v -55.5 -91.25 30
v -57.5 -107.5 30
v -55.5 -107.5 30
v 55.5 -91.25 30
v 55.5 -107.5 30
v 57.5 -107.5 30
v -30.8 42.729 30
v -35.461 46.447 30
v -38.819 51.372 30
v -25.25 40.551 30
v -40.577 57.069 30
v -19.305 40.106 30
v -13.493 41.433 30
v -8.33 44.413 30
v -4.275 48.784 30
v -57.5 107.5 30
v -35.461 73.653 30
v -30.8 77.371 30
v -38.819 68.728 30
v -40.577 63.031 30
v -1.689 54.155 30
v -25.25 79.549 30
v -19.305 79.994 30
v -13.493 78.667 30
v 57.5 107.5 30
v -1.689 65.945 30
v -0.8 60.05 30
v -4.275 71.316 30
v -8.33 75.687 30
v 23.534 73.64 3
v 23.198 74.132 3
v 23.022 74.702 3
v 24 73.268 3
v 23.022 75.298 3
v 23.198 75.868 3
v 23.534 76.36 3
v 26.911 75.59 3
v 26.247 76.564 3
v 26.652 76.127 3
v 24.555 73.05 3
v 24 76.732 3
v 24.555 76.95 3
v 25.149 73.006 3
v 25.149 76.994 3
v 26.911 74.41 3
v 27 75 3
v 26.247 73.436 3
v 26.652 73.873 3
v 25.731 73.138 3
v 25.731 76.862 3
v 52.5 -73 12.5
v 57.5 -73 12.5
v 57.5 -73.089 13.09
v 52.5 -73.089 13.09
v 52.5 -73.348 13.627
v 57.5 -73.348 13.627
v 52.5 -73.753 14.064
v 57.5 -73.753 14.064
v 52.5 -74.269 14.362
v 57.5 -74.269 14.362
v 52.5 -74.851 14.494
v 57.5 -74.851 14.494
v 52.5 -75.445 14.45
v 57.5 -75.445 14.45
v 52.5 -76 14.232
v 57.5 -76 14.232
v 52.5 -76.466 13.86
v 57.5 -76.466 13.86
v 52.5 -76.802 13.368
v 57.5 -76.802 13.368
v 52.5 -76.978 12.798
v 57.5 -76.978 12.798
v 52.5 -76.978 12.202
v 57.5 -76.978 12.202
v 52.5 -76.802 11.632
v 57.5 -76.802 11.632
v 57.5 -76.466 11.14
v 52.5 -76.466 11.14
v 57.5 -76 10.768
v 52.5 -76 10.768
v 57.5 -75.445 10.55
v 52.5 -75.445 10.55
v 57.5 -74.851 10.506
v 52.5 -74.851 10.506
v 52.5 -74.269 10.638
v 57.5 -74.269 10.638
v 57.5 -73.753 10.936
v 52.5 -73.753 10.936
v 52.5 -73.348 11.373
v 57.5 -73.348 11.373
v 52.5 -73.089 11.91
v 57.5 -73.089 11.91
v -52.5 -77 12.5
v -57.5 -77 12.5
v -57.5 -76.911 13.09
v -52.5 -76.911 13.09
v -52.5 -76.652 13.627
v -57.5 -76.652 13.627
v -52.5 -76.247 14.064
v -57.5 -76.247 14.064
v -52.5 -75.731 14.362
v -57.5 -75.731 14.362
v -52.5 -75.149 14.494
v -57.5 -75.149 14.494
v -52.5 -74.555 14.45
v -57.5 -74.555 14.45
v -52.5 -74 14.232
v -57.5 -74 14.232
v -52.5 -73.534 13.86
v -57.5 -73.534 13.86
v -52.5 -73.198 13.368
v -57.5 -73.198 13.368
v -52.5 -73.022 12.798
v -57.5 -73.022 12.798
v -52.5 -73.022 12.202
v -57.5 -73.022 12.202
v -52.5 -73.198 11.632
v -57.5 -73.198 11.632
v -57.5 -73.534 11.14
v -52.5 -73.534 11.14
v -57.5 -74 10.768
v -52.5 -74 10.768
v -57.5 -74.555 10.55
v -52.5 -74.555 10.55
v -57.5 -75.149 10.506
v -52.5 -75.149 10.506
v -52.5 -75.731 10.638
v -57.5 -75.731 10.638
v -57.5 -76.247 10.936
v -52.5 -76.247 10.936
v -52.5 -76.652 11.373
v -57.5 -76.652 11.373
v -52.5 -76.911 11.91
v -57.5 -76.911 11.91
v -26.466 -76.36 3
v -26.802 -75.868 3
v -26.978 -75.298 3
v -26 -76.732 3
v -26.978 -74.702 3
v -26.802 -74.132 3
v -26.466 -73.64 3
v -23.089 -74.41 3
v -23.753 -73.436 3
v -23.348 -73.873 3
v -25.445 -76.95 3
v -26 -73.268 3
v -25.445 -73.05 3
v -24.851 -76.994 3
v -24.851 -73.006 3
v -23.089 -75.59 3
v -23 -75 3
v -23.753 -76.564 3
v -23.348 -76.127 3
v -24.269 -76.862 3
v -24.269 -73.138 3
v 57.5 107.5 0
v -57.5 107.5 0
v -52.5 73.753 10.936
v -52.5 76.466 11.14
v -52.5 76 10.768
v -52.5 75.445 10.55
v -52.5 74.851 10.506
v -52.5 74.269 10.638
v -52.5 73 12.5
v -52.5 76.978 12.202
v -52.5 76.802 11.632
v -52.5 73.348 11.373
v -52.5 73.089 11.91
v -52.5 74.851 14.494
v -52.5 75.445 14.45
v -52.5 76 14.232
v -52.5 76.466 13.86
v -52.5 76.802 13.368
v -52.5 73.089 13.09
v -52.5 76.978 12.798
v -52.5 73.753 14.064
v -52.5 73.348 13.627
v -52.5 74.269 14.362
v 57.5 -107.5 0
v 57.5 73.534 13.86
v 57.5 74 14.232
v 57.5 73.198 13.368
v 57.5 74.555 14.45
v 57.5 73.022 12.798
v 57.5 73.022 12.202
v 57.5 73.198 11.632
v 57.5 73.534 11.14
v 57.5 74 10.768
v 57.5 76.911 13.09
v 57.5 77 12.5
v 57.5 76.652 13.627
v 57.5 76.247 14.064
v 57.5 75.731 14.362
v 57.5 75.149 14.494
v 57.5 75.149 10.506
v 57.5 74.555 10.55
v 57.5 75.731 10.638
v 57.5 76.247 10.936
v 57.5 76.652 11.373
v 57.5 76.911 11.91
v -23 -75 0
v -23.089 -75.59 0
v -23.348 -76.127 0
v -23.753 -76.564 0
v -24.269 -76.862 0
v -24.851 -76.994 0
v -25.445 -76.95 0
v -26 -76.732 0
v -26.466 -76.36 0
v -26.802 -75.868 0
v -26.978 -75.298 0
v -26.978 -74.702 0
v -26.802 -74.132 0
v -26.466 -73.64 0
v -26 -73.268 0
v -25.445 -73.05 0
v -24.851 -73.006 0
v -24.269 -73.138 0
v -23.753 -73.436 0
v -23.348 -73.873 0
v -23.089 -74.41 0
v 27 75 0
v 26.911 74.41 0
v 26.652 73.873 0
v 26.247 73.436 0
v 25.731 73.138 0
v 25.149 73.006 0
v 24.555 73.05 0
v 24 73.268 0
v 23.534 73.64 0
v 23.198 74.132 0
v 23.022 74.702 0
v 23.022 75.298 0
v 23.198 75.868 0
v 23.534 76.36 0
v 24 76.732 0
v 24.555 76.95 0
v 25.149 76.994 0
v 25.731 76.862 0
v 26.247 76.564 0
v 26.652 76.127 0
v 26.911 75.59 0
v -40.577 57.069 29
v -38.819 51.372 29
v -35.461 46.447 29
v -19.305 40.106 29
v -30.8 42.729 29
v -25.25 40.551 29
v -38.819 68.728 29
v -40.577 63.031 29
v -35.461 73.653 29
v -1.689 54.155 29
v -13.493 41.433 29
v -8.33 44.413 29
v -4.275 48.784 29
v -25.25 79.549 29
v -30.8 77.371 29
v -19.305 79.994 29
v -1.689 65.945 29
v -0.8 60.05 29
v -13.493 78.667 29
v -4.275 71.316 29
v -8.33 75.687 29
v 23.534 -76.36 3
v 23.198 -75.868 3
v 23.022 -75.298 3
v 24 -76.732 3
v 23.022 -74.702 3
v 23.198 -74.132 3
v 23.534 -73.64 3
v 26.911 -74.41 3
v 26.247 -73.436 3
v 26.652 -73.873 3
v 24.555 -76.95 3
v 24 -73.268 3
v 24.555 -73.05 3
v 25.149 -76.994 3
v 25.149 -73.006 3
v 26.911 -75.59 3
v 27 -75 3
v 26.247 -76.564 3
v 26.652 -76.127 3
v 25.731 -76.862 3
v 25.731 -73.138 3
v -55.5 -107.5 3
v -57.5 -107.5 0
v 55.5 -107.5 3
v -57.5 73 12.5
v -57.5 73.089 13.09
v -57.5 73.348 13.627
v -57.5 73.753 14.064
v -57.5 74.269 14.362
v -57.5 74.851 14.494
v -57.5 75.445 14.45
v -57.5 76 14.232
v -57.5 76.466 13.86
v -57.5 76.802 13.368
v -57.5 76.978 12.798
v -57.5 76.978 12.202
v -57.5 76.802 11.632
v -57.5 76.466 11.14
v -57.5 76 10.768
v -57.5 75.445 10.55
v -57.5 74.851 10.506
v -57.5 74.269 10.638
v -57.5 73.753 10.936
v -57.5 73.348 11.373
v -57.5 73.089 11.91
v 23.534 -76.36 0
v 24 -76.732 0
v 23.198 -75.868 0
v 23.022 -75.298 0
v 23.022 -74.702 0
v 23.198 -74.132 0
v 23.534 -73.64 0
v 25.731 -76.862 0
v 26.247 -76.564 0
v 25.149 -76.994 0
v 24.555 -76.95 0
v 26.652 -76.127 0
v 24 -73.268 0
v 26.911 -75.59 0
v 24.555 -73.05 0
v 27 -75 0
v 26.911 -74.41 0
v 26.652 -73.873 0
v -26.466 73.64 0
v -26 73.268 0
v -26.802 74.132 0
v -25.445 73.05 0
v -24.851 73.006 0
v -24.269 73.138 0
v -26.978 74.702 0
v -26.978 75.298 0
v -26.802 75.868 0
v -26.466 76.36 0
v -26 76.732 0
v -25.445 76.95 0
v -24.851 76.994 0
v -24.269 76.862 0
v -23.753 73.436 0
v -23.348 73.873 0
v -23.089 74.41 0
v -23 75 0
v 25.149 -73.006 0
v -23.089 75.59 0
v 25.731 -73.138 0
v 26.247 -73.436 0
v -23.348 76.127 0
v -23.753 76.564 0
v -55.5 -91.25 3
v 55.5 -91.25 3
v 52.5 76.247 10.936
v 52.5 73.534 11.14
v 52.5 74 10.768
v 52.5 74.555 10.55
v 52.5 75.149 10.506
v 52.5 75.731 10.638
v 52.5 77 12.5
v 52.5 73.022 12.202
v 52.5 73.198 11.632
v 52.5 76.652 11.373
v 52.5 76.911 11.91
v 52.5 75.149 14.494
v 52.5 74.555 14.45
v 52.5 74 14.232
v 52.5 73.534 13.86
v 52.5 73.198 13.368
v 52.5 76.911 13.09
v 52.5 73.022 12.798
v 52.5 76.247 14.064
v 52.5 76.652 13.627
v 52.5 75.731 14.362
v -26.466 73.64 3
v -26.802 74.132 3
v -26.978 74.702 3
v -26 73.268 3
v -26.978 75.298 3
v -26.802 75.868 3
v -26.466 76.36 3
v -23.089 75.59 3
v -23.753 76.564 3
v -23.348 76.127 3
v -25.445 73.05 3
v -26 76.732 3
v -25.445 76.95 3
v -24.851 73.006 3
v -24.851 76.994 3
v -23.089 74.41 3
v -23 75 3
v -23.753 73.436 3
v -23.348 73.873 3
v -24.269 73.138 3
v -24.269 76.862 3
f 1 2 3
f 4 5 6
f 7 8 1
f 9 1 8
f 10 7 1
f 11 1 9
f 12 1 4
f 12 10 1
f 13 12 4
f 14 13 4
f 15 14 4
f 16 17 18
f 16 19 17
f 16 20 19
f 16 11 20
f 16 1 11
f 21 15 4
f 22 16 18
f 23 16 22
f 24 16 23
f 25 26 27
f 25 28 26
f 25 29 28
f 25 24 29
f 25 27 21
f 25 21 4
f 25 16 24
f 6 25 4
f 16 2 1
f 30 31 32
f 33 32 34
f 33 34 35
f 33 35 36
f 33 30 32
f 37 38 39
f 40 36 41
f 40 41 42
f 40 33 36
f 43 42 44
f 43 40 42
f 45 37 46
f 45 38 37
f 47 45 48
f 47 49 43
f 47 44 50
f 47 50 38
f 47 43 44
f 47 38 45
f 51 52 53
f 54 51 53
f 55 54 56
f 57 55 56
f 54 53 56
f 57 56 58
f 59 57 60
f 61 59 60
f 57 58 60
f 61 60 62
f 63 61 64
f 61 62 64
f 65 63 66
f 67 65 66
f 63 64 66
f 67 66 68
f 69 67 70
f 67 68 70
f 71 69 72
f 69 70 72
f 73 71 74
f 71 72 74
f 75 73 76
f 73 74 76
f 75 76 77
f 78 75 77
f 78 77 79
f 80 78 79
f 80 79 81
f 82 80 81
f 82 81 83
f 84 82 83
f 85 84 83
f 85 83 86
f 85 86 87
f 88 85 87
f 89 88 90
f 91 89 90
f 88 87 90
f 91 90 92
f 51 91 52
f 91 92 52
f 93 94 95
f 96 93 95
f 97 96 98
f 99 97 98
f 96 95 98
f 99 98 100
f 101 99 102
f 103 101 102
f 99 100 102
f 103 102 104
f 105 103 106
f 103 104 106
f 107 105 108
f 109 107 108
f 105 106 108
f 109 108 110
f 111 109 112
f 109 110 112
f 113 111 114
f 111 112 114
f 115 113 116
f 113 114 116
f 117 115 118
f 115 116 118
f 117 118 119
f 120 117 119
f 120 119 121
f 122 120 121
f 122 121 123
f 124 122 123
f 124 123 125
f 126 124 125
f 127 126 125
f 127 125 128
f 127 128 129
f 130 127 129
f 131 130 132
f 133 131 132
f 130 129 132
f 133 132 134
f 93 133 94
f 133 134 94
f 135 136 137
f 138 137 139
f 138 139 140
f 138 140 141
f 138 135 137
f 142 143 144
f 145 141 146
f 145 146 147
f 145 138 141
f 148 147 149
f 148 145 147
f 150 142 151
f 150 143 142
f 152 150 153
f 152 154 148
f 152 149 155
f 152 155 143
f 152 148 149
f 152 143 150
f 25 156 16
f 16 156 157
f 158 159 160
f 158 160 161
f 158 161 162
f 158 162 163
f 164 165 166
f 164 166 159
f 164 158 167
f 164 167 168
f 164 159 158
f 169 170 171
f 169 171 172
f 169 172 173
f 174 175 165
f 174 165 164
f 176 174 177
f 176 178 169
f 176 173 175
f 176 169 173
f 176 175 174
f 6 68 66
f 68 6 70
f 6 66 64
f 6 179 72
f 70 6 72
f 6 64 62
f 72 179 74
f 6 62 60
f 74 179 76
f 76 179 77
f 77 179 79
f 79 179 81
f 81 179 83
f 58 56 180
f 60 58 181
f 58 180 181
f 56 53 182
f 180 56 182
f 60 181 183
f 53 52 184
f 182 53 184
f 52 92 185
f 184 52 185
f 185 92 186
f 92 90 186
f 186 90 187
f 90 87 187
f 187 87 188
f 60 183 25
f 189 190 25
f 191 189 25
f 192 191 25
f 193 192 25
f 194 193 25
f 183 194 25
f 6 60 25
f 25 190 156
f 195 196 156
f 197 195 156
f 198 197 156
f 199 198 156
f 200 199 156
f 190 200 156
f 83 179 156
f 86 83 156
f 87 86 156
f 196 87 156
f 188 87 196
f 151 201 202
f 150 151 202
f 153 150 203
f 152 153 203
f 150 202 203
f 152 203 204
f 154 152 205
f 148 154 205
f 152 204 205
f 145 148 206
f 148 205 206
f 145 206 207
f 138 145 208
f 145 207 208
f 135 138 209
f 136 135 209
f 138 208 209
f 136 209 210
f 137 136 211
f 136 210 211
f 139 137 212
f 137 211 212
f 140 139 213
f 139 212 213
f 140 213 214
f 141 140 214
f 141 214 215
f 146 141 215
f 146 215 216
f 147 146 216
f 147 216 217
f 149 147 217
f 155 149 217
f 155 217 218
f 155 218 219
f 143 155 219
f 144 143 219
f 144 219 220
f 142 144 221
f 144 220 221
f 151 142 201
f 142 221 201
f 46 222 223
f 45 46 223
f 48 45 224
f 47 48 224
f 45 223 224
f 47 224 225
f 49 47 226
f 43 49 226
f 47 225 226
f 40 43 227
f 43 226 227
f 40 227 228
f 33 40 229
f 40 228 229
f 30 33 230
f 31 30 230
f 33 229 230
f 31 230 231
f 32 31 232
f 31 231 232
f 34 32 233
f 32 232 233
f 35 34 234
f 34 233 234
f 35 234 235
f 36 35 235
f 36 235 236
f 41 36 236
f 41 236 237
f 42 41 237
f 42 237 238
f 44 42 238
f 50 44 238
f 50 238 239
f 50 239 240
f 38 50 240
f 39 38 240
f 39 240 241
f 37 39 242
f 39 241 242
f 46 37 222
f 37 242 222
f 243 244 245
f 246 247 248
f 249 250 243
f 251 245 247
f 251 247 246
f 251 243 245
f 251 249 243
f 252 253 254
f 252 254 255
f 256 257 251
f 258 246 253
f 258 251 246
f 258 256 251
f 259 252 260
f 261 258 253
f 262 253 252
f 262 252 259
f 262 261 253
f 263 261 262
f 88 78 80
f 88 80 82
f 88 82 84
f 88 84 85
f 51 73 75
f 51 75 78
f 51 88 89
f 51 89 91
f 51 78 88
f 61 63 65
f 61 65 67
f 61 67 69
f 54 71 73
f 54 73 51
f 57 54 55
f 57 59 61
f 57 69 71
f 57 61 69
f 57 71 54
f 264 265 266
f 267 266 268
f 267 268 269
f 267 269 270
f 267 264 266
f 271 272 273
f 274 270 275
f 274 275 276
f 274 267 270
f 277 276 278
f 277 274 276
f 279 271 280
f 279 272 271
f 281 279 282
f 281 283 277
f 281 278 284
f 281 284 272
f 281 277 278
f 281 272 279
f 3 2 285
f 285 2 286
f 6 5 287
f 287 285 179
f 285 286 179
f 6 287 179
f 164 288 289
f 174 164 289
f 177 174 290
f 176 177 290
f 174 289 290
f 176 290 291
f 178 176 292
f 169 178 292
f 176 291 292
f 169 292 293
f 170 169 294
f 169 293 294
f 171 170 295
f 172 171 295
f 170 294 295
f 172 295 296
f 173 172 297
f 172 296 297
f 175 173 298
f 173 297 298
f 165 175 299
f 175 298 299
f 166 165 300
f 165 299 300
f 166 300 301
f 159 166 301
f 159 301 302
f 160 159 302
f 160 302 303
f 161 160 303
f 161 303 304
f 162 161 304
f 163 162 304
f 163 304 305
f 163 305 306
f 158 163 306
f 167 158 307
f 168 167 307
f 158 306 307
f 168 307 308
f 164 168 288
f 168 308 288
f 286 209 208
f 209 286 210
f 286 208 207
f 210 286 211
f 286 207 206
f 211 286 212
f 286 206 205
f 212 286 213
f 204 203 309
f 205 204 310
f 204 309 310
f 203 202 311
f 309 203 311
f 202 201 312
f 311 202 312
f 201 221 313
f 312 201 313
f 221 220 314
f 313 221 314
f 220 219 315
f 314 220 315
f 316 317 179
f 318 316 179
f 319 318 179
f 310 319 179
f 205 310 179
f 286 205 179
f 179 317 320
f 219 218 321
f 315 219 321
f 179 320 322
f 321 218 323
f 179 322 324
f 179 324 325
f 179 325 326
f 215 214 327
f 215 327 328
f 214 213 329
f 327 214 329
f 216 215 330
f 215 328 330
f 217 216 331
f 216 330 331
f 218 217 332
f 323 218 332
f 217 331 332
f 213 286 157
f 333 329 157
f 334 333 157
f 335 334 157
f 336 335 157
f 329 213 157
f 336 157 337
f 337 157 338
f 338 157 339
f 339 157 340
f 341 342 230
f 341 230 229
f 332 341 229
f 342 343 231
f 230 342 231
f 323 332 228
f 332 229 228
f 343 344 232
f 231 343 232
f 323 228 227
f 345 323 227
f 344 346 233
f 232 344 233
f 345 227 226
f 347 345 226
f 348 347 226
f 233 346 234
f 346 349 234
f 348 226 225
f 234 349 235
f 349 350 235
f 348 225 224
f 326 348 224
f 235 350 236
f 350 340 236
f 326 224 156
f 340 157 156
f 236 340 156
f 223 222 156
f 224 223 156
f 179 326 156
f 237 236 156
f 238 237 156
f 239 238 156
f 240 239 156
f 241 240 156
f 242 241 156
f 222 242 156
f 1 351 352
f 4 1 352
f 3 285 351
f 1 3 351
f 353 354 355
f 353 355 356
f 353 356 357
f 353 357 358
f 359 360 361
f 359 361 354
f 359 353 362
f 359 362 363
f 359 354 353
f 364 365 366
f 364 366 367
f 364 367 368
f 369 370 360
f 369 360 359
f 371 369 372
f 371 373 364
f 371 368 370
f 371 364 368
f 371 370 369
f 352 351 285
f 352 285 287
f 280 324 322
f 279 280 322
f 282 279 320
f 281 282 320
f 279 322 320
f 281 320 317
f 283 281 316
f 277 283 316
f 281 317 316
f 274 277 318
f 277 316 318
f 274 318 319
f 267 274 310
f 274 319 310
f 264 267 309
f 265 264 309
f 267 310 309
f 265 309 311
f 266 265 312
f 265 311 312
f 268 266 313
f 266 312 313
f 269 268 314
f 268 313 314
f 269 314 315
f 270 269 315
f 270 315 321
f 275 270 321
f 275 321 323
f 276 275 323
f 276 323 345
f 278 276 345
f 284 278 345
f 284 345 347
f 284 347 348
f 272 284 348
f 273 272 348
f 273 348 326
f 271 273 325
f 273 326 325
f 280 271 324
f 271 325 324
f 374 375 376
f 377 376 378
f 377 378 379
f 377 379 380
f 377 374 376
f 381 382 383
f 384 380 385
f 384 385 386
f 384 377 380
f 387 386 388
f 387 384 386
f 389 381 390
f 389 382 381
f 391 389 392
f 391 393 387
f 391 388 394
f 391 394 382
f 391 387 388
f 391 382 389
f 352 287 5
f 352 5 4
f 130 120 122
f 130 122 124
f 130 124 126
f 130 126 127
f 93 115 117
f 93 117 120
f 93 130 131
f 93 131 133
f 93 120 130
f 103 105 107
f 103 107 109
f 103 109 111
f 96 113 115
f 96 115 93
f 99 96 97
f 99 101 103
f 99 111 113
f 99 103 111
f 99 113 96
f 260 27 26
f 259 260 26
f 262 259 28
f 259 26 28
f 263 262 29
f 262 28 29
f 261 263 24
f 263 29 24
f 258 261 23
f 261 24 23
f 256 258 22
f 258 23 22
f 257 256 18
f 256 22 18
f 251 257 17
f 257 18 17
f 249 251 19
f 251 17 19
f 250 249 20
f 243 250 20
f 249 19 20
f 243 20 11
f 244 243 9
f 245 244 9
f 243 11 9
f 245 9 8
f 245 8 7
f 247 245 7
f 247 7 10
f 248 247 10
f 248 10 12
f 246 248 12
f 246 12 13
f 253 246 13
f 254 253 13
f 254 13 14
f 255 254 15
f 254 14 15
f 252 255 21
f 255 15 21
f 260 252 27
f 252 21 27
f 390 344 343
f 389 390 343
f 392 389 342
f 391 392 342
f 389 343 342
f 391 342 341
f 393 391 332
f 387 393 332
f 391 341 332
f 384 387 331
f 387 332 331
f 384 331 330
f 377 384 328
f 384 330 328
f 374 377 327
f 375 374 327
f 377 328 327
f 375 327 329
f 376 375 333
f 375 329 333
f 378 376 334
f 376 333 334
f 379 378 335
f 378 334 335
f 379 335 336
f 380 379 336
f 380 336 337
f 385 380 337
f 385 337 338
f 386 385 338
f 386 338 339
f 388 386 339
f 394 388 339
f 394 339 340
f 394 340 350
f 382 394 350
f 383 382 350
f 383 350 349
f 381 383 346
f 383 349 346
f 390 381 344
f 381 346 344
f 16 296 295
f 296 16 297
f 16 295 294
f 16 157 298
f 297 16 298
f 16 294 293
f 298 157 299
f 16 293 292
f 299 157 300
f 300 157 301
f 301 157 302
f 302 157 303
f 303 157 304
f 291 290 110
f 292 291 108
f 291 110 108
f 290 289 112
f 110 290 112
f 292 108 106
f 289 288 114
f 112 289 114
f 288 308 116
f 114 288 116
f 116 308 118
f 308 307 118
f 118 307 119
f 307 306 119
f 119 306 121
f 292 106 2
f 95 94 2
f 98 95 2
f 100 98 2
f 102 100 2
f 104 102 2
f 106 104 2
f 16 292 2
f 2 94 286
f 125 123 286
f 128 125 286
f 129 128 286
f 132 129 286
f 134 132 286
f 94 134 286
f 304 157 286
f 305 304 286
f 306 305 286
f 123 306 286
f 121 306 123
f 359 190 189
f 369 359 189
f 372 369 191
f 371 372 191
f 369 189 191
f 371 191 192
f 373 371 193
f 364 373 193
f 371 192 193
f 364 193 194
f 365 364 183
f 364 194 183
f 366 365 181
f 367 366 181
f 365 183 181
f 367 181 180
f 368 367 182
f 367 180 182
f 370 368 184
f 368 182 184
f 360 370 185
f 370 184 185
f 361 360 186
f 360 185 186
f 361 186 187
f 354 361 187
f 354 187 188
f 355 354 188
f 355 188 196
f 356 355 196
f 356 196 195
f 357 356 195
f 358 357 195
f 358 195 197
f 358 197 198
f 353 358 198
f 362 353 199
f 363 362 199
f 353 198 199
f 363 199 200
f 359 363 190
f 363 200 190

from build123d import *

# Parameters (mm, degrees)
F0_W      = 111
F0_H      = 16.25
F1_DEPTH  = 3
F0_W_2    = 2
F2_DEPTH  = 30
F3_R      = 2
F4_DEPTH  = 5
F5_R      = 2
F6_DEPTH  = 3
F7_R      = 2
F8_DEPTH  = 5
F9_R      = 20
F10_DEPTH = 1


with BuildPart() as f1:
    # F0 (on Top) → F1 (new body)
    with BuildSketch(Plane.XY):
        with Locations((0, -99.375)):
            Rectangle(F0_W, F0_H)
        Polygon((55.5, -91.25), (57.5, -91.25), (57.5, 107.5), (-57.5, 107.5), (-57.5, -91.25), (-55.5, -91.25), align=None)
    extrude(amount=F1_DEPTH)

    # F0 (on Top) → F2 (join)
    with BuildSketch(Plane.XY):
        with Locations((56.5, -99.375)):
            Rectangle(F0_W_2, F0_H)
        with Locations((-56.5, -99.375)):
            Rectangle(F0_W_2, F0_H)
        Polygon((55.5, -91.25), (57.5, -91.25), (57.5, 107.5), (-57.5, 107.5), (-57.5, -91.25), (-55.5, -91.25), align=None)
    extrude(amount=F2_DEPTH)

    # F3 (on face) → F4 (cut)
    with BuildSketch(Plane.YZ.offset(57.5)):
        with Locations((-75, 12.5)):
            Circle(F3_R)
        with Locations((75, 12.5)):
            Circle(F3_R)
    extrude(amount=-F4_DEPTH, mode=Mode.SUBTRACT)

    # F5 (on face) → F6 (cut)
    with BuildSketch(Plane(origin=(0, 0, 0), x_dir=(1, 0, 0), z_dir=(0, 0, -1))):
        with Locations((25, 75)):
            Circle(F5_R)
        with Locations((25, -75)):
            Circle(F5_R)
        with Locations((-25, 75)):
            Circle(F5_R)
        with Locations((-25, -75)):
            Circle(F5_R)
    extrude(amount=-F6_DEPTH, mode=Mode.SUBTRACT)

    # F7 (on face) → F8 (cut)
    with BuildSketch(Plane(origin=(-57.5, 0, 0), x_dir=(0, -1, 0), z_dir=(-1, 0, 0))):
        with Locations((-75, 12.5)):
            Circle(F7_R)
        with Locations((75, 12.5)):
            Circle(F7_R)
    extrude(amount=-F8_DEPTH, mode=Mode.SUBTRACT)

    # F9 (on face) → F10 (cut)
    with BuildSketch(Plane.XY.offset(30)):
        with Locations((-20.8, 60.05)):
            Circle(F9_R)
    extrude(amount=-F10_DEPTH, mode=Mode.SUBTRACT)


solid = f1.part
